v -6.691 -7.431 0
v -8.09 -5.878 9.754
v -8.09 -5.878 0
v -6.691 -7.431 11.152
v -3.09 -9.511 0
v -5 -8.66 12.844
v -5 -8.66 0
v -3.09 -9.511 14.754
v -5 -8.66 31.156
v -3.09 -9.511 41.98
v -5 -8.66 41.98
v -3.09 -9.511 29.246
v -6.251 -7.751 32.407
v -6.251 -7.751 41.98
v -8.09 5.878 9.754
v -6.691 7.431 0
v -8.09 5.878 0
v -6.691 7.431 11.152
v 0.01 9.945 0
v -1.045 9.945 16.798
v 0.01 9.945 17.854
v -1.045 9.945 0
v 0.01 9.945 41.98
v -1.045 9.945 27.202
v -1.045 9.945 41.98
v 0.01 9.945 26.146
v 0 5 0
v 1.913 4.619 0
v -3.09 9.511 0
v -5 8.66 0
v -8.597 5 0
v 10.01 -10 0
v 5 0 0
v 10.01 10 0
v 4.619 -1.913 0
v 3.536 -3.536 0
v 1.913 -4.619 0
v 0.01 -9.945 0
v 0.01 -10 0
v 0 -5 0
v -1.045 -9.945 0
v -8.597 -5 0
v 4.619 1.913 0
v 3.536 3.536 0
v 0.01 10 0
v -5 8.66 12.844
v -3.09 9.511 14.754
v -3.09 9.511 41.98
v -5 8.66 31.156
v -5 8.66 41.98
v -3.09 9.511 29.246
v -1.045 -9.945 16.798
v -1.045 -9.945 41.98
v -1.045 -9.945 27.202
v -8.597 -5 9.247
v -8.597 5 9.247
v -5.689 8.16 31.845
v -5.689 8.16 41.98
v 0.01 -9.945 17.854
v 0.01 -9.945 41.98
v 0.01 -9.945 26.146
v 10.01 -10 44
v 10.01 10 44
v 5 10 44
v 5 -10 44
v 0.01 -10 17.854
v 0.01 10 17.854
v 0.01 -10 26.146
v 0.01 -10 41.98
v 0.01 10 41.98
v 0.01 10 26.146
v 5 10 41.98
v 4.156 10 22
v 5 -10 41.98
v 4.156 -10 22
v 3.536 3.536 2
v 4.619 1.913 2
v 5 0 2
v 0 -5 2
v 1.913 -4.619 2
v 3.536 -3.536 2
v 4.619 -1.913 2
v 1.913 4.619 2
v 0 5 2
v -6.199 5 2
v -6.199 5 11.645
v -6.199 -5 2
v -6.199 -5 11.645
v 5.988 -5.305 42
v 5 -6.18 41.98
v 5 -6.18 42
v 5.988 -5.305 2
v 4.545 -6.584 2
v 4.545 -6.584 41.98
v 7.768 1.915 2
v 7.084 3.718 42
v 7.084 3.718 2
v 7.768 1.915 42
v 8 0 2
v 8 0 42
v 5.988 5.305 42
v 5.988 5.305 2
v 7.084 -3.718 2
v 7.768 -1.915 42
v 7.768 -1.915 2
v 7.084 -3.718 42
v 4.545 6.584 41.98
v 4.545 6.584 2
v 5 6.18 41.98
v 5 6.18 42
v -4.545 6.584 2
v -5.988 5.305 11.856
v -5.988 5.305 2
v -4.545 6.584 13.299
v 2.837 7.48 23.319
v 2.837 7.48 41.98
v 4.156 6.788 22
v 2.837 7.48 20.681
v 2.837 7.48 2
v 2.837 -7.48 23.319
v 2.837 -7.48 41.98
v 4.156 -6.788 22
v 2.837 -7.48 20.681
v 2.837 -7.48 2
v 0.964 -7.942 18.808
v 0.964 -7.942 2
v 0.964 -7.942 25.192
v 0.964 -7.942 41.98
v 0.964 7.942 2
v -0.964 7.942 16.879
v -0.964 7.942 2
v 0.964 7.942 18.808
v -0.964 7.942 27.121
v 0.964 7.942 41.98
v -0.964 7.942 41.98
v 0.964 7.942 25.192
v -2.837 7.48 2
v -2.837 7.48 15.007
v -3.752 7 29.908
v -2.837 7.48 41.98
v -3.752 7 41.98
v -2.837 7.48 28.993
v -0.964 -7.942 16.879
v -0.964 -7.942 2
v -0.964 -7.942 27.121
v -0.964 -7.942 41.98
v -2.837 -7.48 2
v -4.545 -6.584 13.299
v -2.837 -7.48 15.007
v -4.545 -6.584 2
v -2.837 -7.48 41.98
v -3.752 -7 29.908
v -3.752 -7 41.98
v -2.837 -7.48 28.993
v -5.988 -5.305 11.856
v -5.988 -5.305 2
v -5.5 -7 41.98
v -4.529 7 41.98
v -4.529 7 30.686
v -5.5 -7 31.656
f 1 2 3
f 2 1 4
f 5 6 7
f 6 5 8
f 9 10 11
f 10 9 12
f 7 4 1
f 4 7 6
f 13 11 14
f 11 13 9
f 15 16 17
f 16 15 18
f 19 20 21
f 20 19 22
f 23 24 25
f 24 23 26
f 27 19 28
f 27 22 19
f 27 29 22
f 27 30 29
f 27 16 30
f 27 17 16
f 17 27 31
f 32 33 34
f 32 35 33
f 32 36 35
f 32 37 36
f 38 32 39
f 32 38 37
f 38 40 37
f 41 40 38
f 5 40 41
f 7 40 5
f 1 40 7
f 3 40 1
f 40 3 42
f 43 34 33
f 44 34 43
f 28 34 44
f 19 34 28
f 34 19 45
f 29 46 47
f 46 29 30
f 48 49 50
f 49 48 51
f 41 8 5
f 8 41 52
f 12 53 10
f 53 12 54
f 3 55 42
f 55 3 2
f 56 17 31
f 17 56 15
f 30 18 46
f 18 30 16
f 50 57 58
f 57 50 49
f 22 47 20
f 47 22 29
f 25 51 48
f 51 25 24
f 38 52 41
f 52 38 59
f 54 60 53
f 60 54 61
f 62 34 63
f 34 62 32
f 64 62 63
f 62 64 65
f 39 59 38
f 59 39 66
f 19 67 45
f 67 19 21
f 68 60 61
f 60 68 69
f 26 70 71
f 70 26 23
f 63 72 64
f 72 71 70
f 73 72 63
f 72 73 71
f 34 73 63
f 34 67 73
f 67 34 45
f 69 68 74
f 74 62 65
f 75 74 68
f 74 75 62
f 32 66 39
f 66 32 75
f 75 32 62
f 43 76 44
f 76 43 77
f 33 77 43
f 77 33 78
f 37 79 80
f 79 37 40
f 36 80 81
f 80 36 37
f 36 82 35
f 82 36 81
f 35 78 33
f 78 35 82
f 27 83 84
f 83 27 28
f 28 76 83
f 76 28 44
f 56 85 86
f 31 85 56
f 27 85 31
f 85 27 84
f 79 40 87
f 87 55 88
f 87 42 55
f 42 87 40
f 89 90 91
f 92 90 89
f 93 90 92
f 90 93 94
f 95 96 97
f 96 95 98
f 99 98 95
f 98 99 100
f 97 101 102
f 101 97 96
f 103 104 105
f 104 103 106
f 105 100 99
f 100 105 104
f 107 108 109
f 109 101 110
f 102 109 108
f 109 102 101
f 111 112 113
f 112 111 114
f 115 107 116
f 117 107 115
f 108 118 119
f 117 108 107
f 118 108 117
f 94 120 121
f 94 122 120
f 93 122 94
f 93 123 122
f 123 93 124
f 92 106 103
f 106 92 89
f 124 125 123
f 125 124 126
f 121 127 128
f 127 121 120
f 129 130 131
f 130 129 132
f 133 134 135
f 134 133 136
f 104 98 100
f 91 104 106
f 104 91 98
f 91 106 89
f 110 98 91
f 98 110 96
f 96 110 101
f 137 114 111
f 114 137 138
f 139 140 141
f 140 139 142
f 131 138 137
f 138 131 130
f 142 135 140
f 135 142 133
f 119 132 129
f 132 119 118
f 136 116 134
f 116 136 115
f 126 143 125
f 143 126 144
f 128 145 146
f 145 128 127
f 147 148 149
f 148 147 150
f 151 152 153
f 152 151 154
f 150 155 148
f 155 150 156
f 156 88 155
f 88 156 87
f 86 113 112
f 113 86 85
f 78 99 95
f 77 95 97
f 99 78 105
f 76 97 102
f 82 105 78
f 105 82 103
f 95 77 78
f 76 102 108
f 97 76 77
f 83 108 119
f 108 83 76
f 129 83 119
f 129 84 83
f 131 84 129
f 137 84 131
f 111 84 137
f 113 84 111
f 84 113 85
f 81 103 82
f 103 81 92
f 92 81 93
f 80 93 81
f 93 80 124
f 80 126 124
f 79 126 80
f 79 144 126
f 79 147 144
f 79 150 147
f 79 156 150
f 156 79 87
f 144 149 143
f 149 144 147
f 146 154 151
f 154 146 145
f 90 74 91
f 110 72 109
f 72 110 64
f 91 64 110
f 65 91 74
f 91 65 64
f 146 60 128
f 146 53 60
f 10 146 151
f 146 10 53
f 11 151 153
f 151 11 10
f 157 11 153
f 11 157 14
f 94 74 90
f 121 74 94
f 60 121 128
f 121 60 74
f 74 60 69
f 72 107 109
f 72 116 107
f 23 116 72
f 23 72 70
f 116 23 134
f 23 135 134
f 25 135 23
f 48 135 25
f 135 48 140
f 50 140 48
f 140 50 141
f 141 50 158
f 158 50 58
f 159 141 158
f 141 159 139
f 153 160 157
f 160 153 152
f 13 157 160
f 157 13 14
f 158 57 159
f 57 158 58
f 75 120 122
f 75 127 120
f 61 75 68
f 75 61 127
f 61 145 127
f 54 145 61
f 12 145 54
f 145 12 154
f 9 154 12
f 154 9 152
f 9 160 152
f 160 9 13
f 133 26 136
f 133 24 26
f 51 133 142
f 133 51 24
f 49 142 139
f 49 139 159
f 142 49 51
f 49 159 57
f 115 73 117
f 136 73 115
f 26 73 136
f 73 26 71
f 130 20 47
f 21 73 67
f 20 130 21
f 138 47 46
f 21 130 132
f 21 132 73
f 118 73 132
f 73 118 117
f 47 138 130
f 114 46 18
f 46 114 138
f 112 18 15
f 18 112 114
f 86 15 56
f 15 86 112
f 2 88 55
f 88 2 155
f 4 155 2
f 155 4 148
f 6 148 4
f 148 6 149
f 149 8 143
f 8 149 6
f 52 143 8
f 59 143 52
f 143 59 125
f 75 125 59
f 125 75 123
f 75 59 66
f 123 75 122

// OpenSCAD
//lm10uu specs
lm_dia = 16;
lm_height = 40;

rod_dia = 10;

wall = 2;

module lmxuu_mount(dia = lm_dia, height = lm_height){
	rad = lm_dia/2 + wall;
	height=lm_height+wall*2;
	e = 0.01;

	difference(){
		union(){
			//outer cylinder
			cylinder(r1=rad, r2=rad, h=height-wall-e);
			translate([e,-rad,0])
			cube([rad, rad*2, height]);
		}
		
		//bearing hole
		translate([0,0,wall])
		cylinder(r=dia/2, h=lm_height);

		//rod slot
		translate([0,0,-e]){
			cylinder(r = rod_dia/2, h = height+1);
			translate([-rad-2, -rod_dia/2, 0])
			cube([rad+2, rod_dia, height+1]);
		}

		//the top needs to be cut straight
		translate([-rad+rod_dia/2-3,-rad-.5,height-wall-e*2])
		cube([rad+3, rad*2+1, wall+e*3]);
		

		//top slot cut out extra
		translate([-rad-2, -rod_dia/2-wall, height/2])
		cube([rad+2, rod_dia+wall*2, height+1]);
	
		//angle the slot a bit
		translate([-rad+3.5, (-rad-2)/2-wall, height/2])
		rotate([0,0,45])
		cube([rad+2, rad+2, height+1]);
		

		//cube slot cutout
		translate([-rad,0,height/2])
		rotate([0,45,0])
		cube([rad*2+2*e,rad*2+2*e,rad*2+2*e], center=true);

		
		
	}
}

lmxuu_mount(lm_dia, lm_height);
